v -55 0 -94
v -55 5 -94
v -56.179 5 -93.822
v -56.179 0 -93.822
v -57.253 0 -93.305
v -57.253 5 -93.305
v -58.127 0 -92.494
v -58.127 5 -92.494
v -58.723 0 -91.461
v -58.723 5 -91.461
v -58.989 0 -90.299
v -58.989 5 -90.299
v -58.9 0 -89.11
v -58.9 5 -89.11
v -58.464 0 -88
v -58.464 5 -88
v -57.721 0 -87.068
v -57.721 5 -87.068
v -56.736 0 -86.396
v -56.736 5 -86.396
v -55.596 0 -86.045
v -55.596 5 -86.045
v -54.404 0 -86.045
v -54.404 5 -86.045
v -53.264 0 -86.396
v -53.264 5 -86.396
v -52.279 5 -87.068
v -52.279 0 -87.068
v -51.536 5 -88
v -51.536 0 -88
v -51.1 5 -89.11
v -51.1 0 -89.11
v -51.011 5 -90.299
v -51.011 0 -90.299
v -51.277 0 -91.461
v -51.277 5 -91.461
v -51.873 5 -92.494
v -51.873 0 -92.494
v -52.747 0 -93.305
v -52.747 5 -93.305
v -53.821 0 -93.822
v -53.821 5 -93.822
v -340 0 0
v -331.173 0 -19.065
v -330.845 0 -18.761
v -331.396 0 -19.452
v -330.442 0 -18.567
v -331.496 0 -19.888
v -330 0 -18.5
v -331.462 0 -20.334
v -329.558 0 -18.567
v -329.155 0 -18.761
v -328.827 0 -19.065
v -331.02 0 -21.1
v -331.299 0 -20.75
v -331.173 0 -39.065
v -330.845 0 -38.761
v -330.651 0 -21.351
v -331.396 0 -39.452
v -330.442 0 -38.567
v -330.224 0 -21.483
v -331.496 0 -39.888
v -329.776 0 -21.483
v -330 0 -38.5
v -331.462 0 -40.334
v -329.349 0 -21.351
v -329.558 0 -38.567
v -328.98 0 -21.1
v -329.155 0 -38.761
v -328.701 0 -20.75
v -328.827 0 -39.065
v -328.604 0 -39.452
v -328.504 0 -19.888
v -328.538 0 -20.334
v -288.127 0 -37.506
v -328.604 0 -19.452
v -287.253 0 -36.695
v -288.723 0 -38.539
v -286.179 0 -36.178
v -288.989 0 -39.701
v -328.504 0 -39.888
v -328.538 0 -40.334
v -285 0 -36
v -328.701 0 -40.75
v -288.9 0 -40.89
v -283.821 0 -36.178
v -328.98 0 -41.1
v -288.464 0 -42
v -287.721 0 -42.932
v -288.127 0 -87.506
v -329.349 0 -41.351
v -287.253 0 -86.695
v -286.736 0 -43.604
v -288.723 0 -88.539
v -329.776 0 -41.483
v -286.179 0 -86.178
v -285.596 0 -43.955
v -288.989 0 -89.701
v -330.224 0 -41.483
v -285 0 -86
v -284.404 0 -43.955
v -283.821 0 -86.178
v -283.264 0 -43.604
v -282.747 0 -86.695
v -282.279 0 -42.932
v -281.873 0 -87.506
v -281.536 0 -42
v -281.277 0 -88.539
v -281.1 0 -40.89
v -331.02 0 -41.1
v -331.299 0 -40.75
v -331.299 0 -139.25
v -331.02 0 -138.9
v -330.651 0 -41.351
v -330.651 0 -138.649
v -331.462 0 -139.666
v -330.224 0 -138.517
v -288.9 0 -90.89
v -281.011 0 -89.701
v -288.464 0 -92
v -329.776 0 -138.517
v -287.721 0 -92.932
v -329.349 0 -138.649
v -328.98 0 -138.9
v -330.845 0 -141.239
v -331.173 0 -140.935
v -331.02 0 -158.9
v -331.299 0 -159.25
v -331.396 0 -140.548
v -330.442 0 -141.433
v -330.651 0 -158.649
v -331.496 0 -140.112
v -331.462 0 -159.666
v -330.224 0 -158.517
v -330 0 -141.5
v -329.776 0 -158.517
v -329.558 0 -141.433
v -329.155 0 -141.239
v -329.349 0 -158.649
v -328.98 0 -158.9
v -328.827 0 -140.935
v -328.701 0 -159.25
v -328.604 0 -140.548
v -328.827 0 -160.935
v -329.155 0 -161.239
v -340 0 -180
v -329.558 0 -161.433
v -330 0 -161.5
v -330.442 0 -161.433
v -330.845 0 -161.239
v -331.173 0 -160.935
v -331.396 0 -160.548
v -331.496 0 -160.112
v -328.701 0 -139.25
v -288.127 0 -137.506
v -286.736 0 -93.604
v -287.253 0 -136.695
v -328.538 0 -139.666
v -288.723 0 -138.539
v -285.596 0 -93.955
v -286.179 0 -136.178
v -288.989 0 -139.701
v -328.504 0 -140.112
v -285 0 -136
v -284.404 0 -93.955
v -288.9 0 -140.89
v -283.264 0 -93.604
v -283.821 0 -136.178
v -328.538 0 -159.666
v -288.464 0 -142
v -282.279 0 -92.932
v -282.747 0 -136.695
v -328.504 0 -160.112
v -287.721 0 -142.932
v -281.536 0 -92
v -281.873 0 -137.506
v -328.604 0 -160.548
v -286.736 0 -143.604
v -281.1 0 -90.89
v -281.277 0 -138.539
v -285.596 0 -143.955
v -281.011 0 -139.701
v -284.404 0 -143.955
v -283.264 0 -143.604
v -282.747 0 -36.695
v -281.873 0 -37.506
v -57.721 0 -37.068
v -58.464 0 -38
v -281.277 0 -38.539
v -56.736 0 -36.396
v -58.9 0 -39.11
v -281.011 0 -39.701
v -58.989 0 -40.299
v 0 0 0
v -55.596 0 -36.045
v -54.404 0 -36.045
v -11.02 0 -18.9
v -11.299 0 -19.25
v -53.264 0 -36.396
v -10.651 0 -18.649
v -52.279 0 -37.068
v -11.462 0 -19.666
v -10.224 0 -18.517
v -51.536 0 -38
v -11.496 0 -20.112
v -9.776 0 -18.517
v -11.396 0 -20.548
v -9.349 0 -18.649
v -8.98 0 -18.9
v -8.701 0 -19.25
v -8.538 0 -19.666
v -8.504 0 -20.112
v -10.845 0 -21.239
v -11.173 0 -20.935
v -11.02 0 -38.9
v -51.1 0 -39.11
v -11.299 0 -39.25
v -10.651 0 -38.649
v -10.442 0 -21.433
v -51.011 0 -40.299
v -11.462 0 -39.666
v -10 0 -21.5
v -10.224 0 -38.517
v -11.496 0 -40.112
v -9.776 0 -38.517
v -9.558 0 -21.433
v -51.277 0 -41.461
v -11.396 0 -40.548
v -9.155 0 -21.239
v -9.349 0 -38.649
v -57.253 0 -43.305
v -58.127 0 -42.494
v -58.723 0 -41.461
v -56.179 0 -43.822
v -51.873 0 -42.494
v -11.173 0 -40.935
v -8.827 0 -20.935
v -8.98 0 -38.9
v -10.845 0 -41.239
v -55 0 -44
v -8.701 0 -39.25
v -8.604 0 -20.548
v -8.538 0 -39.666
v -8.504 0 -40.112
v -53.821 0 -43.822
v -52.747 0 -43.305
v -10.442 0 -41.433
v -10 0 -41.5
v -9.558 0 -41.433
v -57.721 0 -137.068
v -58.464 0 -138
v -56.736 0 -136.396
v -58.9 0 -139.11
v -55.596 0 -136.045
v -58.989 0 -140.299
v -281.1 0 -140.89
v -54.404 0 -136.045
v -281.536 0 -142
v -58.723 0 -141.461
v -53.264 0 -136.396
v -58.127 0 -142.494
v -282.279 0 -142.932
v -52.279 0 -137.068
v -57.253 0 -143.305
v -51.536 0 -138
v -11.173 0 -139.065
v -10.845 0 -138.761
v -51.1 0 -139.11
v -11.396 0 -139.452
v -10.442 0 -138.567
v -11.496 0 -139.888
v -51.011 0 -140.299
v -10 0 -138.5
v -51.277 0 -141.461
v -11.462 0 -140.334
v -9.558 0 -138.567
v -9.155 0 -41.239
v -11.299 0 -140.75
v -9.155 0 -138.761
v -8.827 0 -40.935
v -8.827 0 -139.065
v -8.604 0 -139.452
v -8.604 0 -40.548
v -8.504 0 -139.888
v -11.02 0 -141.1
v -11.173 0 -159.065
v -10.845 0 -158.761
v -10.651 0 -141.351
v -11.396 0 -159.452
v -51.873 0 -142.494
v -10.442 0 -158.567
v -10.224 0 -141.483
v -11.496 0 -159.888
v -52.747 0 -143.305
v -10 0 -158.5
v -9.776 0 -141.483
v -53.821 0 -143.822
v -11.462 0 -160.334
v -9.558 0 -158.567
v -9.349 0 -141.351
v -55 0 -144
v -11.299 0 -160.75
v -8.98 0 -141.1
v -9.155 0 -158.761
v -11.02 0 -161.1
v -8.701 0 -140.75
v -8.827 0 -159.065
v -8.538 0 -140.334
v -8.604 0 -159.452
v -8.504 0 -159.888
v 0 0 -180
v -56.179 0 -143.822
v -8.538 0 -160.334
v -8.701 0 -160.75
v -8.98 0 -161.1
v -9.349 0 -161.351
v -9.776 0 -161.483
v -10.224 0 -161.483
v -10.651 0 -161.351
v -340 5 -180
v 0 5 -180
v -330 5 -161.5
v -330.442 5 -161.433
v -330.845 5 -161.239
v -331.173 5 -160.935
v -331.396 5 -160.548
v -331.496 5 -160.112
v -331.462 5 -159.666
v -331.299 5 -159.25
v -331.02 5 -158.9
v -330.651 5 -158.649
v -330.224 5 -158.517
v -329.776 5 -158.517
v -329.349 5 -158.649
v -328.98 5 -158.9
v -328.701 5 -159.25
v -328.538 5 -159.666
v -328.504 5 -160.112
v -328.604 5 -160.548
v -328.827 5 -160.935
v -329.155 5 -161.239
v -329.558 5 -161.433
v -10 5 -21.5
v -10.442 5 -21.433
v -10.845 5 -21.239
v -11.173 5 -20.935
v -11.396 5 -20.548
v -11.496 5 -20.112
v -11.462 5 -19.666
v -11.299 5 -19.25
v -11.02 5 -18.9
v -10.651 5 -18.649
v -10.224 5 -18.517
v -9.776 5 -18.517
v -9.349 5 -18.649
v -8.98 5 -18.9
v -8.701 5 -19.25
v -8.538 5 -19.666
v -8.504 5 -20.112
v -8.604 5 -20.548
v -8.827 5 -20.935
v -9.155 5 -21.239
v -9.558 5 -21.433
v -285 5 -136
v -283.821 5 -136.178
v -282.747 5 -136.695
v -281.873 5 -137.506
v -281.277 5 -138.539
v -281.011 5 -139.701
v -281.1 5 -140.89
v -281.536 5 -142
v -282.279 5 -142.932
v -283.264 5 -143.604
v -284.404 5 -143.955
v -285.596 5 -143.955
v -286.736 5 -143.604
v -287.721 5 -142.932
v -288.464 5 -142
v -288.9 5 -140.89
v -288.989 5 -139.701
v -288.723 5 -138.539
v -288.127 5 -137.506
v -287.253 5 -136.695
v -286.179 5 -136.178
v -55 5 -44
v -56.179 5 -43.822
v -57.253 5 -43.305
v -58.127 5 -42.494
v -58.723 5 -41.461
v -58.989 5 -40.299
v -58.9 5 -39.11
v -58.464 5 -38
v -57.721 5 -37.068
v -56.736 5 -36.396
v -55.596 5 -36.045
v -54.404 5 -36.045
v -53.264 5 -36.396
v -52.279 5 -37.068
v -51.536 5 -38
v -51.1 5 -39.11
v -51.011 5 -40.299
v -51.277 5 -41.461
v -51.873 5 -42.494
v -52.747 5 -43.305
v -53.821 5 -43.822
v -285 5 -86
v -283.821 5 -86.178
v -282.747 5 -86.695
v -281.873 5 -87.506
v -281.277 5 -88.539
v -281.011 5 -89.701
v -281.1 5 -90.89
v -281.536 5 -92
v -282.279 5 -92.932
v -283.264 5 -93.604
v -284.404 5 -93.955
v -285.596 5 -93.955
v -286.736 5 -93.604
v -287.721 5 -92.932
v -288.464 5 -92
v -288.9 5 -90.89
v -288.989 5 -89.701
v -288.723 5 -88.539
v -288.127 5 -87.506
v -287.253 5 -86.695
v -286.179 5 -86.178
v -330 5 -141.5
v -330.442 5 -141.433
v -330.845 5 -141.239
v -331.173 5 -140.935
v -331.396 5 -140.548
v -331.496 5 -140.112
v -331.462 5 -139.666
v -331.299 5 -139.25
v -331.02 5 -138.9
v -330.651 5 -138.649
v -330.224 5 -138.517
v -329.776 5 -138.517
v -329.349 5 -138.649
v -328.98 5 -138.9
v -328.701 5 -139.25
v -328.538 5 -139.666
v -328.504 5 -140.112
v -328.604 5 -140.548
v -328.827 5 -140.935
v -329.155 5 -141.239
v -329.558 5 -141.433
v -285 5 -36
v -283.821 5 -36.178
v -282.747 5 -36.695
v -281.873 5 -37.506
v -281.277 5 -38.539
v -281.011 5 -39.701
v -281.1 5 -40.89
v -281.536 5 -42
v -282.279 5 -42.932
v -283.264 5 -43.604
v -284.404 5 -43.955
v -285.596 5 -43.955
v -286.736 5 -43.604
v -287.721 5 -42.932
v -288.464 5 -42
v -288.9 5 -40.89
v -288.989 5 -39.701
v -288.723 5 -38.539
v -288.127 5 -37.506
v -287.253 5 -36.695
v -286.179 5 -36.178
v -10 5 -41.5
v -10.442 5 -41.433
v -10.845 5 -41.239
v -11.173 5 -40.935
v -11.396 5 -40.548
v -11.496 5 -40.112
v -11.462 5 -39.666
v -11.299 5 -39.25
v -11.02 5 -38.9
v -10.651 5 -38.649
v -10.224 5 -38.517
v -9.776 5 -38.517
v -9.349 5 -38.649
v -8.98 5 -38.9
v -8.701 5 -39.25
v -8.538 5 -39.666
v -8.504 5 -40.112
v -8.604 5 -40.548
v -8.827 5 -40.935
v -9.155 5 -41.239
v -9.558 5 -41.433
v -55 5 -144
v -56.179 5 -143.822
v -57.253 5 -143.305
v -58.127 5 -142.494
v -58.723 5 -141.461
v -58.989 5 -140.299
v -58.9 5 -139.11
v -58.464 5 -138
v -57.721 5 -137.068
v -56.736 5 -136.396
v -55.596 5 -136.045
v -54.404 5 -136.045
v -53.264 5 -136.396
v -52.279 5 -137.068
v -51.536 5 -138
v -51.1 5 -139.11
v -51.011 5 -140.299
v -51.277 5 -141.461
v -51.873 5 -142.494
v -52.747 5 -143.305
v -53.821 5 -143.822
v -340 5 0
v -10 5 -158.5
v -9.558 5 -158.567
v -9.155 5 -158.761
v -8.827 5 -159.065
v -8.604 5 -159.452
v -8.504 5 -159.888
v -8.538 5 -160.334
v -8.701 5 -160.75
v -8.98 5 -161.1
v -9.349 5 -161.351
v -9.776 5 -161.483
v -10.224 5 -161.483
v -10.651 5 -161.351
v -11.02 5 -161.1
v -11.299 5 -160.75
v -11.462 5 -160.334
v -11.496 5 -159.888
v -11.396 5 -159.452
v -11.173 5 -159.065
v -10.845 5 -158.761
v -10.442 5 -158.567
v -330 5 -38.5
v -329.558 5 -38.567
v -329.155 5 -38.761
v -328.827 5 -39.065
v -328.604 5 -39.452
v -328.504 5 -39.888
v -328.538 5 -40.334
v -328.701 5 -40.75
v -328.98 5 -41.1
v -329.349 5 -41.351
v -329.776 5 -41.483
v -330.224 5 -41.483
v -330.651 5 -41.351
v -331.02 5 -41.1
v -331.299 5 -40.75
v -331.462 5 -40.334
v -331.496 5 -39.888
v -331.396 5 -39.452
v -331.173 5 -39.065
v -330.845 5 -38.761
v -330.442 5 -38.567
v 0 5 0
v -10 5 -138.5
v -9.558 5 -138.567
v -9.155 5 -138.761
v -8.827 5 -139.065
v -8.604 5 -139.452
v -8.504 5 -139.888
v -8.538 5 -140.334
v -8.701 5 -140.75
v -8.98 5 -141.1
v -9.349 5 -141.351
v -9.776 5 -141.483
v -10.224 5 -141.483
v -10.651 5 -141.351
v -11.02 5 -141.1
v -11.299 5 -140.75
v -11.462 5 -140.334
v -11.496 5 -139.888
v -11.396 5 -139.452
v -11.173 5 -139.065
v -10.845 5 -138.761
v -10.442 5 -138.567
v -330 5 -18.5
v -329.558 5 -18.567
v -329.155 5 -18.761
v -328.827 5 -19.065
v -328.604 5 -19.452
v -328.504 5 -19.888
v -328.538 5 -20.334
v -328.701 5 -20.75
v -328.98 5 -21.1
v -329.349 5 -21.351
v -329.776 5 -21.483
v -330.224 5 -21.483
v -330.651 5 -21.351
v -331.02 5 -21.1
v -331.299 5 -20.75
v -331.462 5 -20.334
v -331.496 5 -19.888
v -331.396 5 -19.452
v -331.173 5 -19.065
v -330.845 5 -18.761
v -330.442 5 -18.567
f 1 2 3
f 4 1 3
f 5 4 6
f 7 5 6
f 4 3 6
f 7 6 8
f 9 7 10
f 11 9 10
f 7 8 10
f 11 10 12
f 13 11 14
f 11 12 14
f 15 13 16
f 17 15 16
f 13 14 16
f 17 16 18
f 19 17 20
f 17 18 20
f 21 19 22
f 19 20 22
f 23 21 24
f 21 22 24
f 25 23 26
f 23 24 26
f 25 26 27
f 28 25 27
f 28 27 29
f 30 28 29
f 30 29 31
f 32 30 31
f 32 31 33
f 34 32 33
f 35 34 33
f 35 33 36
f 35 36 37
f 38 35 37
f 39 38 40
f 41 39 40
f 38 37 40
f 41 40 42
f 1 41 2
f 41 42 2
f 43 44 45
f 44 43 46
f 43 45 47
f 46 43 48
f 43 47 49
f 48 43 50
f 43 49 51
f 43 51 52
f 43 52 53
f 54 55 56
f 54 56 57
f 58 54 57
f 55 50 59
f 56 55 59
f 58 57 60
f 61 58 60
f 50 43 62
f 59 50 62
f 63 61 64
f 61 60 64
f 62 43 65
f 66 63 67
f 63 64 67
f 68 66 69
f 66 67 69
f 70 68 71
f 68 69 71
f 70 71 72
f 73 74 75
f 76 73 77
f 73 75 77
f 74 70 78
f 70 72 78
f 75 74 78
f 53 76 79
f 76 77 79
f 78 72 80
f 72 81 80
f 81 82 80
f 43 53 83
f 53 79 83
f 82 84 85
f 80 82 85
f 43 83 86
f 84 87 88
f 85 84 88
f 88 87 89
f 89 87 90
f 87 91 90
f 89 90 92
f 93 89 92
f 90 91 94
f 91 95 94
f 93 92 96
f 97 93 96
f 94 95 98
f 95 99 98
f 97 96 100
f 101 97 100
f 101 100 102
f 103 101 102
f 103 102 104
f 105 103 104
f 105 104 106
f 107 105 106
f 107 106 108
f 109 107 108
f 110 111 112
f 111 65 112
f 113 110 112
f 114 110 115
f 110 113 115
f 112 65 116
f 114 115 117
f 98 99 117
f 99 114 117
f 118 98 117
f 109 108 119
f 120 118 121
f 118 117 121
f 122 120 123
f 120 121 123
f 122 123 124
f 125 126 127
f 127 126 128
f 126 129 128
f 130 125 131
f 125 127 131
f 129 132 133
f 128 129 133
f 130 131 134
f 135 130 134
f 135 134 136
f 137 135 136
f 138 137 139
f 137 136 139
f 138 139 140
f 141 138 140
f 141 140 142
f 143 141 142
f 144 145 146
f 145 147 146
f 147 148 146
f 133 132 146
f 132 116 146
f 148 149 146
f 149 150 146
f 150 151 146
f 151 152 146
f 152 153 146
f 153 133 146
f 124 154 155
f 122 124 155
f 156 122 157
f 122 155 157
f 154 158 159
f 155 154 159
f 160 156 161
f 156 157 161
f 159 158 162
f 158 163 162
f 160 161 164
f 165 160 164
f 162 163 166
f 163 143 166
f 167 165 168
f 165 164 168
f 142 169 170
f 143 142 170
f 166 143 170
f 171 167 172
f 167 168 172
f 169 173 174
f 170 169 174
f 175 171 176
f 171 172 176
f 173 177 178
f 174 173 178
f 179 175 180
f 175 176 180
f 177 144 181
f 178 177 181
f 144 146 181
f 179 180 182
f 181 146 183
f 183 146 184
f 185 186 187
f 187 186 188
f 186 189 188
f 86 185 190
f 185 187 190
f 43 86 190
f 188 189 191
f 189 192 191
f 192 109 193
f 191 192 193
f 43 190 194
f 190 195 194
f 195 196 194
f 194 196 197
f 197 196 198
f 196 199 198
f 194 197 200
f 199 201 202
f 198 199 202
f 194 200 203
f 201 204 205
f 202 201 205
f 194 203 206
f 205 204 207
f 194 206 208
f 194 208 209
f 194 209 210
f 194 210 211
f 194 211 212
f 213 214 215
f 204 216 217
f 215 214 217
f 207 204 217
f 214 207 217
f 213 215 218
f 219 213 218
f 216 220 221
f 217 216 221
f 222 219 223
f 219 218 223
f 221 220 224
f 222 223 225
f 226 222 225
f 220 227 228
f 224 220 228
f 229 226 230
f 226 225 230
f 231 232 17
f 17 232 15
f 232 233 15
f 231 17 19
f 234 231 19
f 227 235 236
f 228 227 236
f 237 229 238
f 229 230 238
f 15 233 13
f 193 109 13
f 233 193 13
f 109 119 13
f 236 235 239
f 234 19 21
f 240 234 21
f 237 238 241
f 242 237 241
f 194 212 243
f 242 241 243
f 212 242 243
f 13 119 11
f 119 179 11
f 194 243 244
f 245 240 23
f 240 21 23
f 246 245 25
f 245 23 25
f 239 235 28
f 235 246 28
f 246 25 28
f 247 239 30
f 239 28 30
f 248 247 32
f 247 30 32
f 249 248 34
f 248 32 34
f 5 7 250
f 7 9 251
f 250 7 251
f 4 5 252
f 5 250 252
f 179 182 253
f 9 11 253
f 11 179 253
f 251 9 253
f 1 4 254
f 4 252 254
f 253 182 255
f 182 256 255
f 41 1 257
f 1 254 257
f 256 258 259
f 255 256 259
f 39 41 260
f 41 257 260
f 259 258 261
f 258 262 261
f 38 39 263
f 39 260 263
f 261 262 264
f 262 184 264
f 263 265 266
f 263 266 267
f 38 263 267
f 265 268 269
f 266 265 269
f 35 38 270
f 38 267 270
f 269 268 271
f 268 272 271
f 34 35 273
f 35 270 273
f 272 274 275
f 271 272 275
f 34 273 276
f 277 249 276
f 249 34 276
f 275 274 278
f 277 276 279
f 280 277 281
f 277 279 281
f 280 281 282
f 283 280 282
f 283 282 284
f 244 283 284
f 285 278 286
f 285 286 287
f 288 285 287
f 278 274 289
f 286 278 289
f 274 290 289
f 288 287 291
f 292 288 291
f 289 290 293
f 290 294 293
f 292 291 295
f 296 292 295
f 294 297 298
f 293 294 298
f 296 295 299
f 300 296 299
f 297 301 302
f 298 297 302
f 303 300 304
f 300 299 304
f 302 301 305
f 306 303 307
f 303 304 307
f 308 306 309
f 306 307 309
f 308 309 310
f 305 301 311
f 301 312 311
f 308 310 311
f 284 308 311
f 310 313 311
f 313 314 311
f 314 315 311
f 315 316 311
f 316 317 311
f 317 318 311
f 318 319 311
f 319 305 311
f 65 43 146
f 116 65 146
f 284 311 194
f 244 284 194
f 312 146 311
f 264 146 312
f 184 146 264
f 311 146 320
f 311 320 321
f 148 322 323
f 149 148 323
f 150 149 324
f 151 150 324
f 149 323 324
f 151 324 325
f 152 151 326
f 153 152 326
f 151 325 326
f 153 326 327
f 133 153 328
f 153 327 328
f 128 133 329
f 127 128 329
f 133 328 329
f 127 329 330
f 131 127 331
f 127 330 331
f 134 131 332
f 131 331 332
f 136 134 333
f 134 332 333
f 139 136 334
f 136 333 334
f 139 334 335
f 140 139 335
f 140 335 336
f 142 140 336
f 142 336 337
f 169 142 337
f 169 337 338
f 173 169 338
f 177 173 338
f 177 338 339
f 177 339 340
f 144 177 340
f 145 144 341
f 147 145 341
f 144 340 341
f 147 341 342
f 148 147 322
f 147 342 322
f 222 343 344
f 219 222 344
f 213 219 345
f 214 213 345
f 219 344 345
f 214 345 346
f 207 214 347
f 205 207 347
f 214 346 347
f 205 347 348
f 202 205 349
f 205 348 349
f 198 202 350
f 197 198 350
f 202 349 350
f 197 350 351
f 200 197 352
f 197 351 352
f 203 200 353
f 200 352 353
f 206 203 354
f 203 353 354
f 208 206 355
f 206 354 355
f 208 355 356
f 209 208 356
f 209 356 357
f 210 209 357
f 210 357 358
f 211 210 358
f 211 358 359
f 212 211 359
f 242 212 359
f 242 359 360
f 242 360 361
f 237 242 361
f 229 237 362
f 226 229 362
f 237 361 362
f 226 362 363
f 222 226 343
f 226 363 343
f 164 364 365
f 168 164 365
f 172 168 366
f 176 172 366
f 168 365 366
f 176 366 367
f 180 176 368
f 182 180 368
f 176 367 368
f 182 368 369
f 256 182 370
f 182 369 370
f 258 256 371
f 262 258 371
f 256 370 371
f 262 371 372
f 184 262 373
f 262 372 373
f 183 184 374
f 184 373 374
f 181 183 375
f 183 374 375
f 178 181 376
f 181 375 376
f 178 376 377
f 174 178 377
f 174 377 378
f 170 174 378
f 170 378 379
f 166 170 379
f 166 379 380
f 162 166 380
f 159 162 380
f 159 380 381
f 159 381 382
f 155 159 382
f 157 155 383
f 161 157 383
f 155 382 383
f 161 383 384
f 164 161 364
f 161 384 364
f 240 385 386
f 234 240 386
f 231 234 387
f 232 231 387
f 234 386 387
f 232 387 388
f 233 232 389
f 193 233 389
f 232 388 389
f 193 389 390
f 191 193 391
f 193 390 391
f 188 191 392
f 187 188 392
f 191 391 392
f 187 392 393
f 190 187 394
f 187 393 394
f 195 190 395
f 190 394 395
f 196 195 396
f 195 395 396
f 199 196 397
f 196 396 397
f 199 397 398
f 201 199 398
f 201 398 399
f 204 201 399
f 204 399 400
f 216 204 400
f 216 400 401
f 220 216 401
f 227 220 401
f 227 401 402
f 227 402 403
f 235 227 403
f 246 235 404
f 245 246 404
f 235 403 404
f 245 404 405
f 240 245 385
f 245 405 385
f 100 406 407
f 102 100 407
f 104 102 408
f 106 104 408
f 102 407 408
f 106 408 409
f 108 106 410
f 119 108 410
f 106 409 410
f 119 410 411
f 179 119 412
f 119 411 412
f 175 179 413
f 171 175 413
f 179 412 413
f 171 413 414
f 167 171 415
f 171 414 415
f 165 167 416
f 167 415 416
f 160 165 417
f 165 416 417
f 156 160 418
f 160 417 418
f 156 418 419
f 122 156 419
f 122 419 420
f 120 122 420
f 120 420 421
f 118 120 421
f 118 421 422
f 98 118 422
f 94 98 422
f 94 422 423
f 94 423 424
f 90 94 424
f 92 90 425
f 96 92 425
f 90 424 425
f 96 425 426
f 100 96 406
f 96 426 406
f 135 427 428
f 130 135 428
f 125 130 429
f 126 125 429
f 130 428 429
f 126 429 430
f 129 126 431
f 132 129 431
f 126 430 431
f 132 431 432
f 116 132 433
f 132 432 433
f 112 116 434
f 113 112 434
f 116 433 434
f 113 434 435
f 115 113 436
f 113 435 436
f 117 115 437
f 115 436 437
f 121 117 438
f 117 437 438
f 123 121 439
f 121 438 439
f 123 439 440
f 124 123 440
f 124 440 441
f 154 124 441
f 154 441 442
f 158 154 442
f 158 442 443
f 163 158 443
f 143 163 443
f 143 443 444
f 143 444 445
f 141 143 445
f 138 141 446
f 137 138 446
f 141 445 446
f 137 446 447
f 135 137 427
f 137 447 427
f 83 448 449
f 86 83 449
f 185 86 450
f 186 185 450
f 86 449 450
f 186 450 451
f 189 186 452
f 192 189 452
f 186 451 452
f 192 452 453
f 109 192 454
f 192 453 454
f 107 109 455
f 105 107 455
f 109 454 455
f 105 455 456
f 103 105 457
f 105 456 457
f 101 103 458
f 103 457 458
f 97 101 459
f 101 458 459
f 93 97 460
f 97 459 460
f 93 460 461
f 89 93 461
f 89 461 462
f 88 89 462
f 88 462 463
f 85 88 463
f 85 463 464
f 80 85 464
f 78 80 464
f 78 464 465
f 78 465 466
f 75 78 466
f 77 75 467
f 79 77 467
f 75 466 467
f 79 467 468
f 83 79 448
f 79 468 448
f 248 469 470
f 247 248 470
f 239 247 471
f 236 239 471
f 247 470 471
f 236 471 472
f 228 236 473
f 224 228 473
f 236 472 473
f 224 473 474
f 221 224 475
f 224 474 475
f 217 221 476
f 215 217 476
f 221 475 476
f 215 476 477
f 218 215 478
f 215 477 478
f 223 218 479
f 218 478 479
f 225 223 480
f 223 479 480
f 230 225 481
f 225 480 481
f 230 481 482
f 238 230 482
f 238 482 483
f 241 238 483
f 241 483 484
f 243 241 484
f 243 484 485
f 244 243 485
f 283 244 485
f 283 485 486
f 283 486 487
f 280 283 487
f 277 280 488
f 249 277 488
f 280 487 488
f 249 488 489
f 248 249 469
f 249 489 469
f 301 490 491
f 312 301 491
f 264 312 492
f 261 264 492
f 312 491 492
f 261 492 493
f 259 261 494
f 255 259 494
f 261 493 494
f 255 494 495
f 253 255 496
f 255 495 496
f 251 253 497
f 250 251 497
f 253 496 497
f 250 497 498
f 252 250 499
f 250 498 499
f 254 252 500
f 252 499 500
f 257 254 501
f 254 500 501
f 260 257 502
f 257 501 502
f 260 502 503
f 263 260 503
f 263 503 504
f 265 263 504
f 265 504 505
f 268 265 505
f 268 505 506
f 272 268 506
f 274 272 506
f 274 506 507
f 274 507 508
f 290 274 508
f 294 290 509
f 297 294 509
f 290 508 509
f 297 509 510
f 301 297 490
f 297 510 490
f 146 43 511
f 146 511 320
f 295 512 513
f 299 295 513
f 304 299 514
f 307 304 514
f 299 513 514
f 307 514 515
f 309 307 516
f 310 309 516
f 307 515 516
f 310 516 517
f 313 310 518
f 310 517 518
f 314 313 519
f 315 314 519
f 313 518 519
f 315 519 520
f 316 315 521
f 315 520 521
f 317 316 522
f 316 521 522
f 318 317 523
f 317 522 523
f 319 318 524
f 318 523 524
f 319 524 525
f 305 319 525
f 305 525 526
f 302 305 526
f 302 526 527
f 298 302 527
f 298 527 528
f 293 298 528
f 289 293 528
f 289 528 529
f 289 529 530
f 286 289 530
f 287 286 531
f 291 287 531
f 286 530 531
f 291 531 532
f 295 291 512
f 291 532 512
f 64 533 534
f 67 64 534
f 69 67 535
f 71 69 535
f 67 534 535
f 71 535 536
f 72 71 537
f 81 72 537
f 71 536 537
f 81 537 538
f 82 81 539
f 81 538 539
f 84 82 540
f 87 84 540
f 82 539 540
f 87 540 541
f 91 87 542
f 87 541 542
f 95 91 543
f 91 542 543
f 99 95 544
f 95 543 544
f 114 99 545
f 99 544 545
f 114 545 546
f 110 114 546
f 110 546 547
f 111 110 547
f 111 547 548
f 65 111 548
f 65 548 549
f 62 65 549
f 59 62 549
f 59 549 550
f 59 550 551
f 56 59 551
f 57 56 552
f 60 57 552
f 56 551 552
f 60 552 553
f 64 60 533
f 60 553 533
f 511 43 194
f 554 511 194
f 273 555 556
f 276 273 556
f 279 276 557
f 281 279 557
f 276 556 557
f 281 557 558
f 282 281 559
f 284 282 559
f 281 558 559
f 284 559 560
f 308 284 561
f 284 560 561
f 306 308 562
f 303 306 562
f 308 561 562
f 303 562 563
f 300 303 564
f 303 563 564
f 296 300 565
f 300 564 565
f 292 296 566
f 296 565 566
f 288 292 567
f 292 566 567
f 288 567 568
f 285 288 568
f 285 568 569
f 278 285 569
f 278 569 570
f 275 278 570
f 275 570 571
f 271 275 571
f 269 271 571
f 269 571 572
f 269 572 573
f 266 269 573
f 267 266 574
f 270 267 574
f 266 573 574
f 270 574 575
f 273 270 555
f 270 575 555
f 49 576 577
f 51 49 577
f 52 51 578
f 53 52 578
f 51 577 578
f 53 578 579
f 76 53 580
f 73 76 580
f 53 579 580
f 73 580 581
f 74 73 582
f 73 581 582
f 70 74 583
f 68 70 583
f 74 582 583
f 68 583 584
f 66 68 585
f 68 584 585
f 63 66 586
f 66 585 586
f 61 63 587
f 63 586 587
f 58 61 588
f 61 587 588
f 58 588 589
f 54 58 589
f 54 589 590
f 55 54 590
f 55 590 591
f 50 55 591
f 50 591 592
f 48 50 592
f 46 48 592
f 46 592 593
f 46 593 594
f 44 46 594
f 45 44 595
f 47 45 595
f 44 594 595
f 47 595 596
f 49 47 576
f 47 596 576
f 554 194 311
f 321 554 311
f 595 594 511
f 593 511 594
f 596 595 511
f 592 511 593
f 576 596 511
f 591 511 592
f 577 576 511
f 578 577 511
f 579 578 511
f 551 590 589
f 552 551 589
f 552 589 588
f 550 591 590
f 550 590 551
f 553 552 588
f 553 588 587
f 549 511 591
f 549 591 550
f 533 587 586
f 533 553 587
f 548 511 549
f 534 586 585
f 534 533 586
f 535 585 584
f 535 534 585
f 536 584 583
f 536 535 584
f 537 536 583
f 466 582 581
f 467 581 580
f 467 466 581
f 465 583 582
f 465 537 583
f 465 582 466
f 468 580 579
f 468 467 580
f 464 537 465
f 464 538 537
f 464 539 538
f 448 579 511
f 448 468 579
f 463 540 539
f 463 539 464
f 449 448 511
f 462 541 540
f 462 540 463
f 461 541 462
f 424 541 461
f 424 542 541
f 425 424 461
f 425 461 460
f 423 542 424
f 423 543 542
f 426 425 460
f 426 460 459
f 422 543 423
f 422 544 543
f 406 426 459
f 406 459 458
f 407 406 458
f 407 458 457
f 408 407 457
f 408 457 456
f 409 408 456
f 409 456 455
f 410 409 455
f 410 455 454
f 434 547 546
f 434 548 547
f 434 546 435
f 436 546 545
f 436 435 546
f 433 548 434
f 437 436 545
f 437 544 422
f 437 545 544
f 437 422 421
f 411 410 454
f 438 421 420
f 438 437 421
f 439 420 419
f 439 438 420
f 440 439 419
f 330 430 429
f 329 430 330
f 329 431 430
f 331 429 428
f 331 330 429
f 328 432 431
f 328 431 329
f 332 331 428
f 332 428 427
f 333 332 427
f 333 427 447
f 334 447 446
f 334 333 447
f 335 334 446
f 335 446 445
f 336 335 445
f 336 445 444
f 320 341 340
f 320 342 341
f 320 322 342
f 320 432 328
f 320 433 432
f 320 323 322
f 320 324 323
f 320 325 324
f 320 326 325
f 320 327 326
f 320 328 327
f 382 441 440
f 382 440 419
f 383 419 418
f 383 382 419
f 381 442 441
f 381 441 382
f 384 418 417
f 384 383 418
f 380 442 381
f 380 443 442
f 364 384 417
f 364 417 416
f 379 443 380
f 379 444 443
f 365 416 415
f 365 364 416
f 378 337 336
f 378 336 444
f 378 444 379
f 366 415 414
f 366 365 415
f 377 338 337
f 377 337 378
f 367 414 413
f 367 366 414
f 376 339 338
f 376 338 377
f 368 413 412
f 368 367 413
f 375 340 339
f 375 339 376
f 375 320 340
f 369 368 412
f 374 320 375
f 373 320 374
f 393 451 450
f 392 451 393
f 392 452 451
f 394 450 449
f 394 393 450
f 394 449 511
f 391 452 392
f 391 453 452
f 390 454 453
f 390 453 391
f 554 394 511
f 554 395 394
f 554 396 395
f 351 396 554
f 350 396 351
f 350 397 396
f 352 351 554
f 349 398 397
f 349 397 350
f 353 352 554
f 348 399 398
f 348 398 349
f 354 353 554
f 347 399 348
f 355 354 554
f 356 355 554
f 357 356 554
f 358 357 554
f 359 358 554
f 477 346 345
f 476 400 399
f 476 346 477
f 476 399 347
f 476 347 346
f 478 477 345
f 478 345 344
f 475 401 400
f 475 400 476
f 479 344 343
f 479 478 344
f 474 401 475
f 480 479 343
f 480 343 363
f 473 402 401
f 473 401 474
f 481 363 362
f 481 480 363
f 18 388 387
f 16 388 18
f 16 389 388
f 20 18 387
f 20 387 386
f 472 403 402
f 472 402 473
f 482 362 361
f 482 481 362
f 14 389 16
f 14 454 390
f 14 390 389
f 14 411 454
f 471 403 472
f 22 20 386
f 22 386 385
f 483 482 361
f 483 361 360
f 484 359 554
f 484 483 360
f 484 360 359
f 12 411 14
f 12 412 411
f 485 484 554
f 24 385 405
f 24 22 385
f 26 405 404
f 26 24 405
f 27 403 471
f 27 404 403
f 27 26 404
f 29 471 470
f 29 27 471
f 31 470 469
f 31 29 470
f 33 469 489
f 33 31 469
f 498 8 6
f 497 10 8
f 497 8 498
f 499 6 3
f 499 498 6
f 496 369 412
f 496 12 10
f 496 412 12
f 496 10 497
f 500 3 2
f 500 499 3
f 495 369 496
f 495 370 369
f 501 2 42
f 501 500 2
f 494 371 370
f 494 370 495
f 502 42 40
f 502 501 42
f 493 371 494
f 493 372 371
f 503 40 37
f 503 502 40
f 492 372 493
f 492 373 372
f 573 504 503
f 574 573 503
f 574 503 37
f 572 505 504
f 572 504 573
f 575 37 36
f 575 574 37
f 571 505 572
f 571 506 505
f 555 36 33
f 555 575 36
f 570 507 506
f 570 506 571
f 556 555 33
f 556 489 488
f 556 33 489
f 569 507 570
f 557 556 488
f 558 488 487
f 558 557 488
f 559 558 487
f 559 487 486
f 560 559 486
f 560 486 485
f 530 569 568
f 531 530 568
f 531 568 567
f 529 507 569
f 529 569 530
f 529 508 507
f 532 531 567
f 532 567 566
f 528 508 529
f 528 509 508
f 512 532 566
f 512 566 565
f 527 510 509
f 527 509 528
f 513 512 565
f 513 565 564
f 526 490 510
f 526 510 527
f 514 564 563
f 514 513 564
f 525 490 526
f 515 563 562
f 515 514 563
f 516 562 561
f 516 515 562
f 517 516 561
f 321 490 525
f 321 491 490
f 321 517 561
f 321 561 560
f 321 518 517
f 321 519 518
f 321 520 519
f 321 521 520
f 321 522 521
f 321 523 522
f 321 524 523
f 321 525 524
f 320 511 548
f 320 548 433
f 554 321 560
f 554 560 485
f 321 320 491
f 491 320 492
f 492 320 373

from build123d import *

# Parameters (mm, degrees)
SKETCH_1_W          = 340
SKETCH_1_H          = 180
EXTRUDE_1_DEPTH     = 5
SKETCH_2_R          = 1.5
CUT_EXTRUDE_1_DEPTH = 5
SKETCH_4_R          = 4
CUT_EXTRUDE_2_DEPTH = 5


with BuildPart() as part:
    # 草图1 → 凸台-拉伸1 (new body)
    with BuildSketch(Plane(origin=(0, 0, 0), x_dir=(1, 0, 0), z_dir=(0, 1, 0))):
        with Locations((-170, 90)):
            Rectangle(SKETCH_1_W, SKETCH_1_H)
    extrude(amount=EXTRUDE_1_DEPTH)

    # 草图2 → 切除-拉伸1 (cut)
    with BuildSketch(Plane(origin=(0, 5, 0), x_dir=(1, 0, 0), z_dir=(0, 1, 0))):
        with Locations(Location((-330, 20, 0), (0, 0, 270))):
            Circle(SKETCH_2_R)
        with Locations(Location((-330, 40, 0), (0, 0, 270))):
            Circle(SKETCH_2_R)
        with Locations(Location((-330, 140, 0), (0, 0, 90))):
            Circle(SKETCH_2_R)
        with Locations(Location((-330, 160, 0), (0, 0, 90))):
            Circle(SKETCH_2_R)
        with Locations(Location((-10, 160, 0), (0, 0, 270))):
            Circle(SKETCH_2_R)
        with Locations(Location((-10, 140, 0), (0, 0, 270))):
            Circle(SKETCH_2_R)
        with Locations(Location((-10, 40, 0), (0, 0, 90))):
            Circle(SKETCH_2_R)
        with Locations(Location((-10, 20, 0), (0, 0, 90))):
            Circle(SKETCH_2_R)
    extrude(amount=-CUT_EXTRUDE_1_DEPTH, mode=Mode.SUBTRACT)

    # 草图4 → 切除-拉伸2 (cut)
    with BuildSketch(Plane(origin=(0, 5, 0), x_dir=(1, 0, 0), z_dir=(0, 1, 0))):
        with Locations(Location((-285, 140, 0), (0, 0, 270))):
            Circle(SKETCH_4_R)
        with Locations(Location((-285, 90, 0), (0, 0, 270))):
            Circle(SKETCH_4_R)
        with Locations(Location((-285, 40, 0), (0, 0, 270))):
            Circle(SKETCH_4_R)
        with Locations(Location((-55, 40, 0), (0, 0, 90))):
            Circle(SKETCH_4_R)
        with Locations(Location((-55, 90, 0), (0, 0, 90))):
            Circle(SKETCH_4_R)
        with Locations(Location((-55, 140, 0), (0, 0, 90))):
            Circle(SKETCH_4_R)
    extrude(amount=-CUT_EXTRUDE_2_DEPTH, mode=Mode.SUBTRACT)


solid = part.part
